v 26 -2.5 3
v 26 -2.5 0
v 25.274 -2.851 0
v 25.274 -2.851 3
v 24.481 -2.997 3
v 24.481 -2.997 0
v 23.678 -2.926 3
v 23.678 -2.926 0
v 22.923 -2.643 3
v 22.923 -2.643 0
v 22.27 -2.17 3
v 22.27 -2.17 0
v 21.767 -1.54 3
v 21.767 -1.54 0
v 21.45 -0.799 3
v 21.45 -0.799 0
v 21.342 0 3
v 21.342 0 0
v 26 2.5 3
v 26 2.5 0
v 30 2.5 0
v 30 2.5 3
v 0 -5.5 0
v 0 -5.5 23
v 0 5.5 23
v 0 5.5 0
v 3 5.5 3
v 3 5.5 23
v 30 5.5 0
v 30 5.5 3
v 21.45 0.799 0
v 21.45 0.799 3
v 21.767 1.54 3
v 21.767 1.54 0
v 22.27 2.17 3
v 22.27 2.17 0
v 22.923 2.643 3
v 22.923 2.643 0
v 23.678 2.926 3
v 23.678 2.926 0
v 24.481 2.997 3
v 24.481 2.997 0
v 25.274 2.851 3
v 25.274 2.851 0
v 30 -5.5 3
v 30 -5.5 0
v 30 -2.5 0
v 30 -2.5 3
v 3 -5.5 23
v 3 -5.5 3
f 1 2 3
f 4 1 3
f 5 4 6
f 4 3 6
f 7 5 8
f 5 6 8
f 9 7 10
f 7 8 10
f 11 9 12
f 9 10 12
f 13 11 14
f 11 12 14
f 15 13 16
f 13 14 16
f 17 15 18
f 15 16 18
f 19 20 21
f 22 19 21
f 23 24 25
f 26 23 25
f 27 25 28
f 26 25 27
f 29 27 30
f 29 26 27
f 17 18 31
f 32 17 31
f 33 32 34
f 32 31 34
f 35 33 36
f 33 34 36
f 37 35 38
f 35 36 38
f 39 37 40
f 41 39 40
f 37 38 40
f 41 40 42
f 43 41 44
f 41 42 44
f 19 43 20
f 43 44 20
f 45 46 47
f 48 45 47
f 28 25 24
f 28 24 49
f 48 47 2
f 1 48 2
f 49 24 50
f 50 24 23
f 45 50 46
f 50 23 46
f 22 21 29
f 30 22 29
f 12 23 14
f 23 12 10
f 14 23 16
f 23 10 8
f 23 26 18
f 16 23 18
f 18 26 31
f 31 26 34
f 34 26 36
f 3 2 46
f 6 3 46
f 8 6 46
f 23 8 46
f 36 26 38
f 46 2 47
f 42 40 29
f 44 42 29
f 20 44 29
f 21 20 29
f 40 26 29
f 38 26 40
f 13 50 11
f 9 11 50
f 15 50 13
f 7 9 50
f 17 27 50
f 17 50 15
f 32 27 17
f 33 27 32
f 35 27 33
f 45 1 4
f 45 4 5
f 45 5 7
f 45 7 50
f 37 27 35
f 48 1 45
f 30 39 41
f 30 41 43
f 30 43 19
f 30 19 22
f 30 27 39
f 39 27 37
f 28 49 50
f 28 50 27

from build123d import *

# Parameters (mm, degrees)
F1_DEPTH = 3
F2_W     = 3
F2_H     = 11
F3_DEPTH = 20


with BuildPart() as f1:
    # F0 (on Top) → F1 (new body)
    with BuildSketch(Plane.XY):
        with BuildLine():
            Line((0, 5.5), (0, 0))
            Line((0, 0), (0, -5.5))
            Line((0, -5.5), (30, -5.5))
            Line((30, -5.5), (30, -2.5))
            Line((30, -2.5), (26, -2.5))
            ThreePointArc((26, -2.5), (22.92305, -2.643382), (21.341688, 0))
            ThreePointArc((21.341688, 0), (22.92305, 2.643382), (26, 2.5))
            Line((26, 2.5), (30, 2.5))
            Line((30, 2.5), (30, 5.5))
            Line((30, 5.5), (0, 5.5))
        make_face()
    extrude(amount=F1_DEPTH)

    # F2 (on face) → F3 (join)
    with BuildSketch(Plane.XY.offset(3)):
        with Locations((1.5, 0)):
            Rectangle(F2_W, F2_H)
    extrude(amount=F3_DEPTH)


solid = f1.part
